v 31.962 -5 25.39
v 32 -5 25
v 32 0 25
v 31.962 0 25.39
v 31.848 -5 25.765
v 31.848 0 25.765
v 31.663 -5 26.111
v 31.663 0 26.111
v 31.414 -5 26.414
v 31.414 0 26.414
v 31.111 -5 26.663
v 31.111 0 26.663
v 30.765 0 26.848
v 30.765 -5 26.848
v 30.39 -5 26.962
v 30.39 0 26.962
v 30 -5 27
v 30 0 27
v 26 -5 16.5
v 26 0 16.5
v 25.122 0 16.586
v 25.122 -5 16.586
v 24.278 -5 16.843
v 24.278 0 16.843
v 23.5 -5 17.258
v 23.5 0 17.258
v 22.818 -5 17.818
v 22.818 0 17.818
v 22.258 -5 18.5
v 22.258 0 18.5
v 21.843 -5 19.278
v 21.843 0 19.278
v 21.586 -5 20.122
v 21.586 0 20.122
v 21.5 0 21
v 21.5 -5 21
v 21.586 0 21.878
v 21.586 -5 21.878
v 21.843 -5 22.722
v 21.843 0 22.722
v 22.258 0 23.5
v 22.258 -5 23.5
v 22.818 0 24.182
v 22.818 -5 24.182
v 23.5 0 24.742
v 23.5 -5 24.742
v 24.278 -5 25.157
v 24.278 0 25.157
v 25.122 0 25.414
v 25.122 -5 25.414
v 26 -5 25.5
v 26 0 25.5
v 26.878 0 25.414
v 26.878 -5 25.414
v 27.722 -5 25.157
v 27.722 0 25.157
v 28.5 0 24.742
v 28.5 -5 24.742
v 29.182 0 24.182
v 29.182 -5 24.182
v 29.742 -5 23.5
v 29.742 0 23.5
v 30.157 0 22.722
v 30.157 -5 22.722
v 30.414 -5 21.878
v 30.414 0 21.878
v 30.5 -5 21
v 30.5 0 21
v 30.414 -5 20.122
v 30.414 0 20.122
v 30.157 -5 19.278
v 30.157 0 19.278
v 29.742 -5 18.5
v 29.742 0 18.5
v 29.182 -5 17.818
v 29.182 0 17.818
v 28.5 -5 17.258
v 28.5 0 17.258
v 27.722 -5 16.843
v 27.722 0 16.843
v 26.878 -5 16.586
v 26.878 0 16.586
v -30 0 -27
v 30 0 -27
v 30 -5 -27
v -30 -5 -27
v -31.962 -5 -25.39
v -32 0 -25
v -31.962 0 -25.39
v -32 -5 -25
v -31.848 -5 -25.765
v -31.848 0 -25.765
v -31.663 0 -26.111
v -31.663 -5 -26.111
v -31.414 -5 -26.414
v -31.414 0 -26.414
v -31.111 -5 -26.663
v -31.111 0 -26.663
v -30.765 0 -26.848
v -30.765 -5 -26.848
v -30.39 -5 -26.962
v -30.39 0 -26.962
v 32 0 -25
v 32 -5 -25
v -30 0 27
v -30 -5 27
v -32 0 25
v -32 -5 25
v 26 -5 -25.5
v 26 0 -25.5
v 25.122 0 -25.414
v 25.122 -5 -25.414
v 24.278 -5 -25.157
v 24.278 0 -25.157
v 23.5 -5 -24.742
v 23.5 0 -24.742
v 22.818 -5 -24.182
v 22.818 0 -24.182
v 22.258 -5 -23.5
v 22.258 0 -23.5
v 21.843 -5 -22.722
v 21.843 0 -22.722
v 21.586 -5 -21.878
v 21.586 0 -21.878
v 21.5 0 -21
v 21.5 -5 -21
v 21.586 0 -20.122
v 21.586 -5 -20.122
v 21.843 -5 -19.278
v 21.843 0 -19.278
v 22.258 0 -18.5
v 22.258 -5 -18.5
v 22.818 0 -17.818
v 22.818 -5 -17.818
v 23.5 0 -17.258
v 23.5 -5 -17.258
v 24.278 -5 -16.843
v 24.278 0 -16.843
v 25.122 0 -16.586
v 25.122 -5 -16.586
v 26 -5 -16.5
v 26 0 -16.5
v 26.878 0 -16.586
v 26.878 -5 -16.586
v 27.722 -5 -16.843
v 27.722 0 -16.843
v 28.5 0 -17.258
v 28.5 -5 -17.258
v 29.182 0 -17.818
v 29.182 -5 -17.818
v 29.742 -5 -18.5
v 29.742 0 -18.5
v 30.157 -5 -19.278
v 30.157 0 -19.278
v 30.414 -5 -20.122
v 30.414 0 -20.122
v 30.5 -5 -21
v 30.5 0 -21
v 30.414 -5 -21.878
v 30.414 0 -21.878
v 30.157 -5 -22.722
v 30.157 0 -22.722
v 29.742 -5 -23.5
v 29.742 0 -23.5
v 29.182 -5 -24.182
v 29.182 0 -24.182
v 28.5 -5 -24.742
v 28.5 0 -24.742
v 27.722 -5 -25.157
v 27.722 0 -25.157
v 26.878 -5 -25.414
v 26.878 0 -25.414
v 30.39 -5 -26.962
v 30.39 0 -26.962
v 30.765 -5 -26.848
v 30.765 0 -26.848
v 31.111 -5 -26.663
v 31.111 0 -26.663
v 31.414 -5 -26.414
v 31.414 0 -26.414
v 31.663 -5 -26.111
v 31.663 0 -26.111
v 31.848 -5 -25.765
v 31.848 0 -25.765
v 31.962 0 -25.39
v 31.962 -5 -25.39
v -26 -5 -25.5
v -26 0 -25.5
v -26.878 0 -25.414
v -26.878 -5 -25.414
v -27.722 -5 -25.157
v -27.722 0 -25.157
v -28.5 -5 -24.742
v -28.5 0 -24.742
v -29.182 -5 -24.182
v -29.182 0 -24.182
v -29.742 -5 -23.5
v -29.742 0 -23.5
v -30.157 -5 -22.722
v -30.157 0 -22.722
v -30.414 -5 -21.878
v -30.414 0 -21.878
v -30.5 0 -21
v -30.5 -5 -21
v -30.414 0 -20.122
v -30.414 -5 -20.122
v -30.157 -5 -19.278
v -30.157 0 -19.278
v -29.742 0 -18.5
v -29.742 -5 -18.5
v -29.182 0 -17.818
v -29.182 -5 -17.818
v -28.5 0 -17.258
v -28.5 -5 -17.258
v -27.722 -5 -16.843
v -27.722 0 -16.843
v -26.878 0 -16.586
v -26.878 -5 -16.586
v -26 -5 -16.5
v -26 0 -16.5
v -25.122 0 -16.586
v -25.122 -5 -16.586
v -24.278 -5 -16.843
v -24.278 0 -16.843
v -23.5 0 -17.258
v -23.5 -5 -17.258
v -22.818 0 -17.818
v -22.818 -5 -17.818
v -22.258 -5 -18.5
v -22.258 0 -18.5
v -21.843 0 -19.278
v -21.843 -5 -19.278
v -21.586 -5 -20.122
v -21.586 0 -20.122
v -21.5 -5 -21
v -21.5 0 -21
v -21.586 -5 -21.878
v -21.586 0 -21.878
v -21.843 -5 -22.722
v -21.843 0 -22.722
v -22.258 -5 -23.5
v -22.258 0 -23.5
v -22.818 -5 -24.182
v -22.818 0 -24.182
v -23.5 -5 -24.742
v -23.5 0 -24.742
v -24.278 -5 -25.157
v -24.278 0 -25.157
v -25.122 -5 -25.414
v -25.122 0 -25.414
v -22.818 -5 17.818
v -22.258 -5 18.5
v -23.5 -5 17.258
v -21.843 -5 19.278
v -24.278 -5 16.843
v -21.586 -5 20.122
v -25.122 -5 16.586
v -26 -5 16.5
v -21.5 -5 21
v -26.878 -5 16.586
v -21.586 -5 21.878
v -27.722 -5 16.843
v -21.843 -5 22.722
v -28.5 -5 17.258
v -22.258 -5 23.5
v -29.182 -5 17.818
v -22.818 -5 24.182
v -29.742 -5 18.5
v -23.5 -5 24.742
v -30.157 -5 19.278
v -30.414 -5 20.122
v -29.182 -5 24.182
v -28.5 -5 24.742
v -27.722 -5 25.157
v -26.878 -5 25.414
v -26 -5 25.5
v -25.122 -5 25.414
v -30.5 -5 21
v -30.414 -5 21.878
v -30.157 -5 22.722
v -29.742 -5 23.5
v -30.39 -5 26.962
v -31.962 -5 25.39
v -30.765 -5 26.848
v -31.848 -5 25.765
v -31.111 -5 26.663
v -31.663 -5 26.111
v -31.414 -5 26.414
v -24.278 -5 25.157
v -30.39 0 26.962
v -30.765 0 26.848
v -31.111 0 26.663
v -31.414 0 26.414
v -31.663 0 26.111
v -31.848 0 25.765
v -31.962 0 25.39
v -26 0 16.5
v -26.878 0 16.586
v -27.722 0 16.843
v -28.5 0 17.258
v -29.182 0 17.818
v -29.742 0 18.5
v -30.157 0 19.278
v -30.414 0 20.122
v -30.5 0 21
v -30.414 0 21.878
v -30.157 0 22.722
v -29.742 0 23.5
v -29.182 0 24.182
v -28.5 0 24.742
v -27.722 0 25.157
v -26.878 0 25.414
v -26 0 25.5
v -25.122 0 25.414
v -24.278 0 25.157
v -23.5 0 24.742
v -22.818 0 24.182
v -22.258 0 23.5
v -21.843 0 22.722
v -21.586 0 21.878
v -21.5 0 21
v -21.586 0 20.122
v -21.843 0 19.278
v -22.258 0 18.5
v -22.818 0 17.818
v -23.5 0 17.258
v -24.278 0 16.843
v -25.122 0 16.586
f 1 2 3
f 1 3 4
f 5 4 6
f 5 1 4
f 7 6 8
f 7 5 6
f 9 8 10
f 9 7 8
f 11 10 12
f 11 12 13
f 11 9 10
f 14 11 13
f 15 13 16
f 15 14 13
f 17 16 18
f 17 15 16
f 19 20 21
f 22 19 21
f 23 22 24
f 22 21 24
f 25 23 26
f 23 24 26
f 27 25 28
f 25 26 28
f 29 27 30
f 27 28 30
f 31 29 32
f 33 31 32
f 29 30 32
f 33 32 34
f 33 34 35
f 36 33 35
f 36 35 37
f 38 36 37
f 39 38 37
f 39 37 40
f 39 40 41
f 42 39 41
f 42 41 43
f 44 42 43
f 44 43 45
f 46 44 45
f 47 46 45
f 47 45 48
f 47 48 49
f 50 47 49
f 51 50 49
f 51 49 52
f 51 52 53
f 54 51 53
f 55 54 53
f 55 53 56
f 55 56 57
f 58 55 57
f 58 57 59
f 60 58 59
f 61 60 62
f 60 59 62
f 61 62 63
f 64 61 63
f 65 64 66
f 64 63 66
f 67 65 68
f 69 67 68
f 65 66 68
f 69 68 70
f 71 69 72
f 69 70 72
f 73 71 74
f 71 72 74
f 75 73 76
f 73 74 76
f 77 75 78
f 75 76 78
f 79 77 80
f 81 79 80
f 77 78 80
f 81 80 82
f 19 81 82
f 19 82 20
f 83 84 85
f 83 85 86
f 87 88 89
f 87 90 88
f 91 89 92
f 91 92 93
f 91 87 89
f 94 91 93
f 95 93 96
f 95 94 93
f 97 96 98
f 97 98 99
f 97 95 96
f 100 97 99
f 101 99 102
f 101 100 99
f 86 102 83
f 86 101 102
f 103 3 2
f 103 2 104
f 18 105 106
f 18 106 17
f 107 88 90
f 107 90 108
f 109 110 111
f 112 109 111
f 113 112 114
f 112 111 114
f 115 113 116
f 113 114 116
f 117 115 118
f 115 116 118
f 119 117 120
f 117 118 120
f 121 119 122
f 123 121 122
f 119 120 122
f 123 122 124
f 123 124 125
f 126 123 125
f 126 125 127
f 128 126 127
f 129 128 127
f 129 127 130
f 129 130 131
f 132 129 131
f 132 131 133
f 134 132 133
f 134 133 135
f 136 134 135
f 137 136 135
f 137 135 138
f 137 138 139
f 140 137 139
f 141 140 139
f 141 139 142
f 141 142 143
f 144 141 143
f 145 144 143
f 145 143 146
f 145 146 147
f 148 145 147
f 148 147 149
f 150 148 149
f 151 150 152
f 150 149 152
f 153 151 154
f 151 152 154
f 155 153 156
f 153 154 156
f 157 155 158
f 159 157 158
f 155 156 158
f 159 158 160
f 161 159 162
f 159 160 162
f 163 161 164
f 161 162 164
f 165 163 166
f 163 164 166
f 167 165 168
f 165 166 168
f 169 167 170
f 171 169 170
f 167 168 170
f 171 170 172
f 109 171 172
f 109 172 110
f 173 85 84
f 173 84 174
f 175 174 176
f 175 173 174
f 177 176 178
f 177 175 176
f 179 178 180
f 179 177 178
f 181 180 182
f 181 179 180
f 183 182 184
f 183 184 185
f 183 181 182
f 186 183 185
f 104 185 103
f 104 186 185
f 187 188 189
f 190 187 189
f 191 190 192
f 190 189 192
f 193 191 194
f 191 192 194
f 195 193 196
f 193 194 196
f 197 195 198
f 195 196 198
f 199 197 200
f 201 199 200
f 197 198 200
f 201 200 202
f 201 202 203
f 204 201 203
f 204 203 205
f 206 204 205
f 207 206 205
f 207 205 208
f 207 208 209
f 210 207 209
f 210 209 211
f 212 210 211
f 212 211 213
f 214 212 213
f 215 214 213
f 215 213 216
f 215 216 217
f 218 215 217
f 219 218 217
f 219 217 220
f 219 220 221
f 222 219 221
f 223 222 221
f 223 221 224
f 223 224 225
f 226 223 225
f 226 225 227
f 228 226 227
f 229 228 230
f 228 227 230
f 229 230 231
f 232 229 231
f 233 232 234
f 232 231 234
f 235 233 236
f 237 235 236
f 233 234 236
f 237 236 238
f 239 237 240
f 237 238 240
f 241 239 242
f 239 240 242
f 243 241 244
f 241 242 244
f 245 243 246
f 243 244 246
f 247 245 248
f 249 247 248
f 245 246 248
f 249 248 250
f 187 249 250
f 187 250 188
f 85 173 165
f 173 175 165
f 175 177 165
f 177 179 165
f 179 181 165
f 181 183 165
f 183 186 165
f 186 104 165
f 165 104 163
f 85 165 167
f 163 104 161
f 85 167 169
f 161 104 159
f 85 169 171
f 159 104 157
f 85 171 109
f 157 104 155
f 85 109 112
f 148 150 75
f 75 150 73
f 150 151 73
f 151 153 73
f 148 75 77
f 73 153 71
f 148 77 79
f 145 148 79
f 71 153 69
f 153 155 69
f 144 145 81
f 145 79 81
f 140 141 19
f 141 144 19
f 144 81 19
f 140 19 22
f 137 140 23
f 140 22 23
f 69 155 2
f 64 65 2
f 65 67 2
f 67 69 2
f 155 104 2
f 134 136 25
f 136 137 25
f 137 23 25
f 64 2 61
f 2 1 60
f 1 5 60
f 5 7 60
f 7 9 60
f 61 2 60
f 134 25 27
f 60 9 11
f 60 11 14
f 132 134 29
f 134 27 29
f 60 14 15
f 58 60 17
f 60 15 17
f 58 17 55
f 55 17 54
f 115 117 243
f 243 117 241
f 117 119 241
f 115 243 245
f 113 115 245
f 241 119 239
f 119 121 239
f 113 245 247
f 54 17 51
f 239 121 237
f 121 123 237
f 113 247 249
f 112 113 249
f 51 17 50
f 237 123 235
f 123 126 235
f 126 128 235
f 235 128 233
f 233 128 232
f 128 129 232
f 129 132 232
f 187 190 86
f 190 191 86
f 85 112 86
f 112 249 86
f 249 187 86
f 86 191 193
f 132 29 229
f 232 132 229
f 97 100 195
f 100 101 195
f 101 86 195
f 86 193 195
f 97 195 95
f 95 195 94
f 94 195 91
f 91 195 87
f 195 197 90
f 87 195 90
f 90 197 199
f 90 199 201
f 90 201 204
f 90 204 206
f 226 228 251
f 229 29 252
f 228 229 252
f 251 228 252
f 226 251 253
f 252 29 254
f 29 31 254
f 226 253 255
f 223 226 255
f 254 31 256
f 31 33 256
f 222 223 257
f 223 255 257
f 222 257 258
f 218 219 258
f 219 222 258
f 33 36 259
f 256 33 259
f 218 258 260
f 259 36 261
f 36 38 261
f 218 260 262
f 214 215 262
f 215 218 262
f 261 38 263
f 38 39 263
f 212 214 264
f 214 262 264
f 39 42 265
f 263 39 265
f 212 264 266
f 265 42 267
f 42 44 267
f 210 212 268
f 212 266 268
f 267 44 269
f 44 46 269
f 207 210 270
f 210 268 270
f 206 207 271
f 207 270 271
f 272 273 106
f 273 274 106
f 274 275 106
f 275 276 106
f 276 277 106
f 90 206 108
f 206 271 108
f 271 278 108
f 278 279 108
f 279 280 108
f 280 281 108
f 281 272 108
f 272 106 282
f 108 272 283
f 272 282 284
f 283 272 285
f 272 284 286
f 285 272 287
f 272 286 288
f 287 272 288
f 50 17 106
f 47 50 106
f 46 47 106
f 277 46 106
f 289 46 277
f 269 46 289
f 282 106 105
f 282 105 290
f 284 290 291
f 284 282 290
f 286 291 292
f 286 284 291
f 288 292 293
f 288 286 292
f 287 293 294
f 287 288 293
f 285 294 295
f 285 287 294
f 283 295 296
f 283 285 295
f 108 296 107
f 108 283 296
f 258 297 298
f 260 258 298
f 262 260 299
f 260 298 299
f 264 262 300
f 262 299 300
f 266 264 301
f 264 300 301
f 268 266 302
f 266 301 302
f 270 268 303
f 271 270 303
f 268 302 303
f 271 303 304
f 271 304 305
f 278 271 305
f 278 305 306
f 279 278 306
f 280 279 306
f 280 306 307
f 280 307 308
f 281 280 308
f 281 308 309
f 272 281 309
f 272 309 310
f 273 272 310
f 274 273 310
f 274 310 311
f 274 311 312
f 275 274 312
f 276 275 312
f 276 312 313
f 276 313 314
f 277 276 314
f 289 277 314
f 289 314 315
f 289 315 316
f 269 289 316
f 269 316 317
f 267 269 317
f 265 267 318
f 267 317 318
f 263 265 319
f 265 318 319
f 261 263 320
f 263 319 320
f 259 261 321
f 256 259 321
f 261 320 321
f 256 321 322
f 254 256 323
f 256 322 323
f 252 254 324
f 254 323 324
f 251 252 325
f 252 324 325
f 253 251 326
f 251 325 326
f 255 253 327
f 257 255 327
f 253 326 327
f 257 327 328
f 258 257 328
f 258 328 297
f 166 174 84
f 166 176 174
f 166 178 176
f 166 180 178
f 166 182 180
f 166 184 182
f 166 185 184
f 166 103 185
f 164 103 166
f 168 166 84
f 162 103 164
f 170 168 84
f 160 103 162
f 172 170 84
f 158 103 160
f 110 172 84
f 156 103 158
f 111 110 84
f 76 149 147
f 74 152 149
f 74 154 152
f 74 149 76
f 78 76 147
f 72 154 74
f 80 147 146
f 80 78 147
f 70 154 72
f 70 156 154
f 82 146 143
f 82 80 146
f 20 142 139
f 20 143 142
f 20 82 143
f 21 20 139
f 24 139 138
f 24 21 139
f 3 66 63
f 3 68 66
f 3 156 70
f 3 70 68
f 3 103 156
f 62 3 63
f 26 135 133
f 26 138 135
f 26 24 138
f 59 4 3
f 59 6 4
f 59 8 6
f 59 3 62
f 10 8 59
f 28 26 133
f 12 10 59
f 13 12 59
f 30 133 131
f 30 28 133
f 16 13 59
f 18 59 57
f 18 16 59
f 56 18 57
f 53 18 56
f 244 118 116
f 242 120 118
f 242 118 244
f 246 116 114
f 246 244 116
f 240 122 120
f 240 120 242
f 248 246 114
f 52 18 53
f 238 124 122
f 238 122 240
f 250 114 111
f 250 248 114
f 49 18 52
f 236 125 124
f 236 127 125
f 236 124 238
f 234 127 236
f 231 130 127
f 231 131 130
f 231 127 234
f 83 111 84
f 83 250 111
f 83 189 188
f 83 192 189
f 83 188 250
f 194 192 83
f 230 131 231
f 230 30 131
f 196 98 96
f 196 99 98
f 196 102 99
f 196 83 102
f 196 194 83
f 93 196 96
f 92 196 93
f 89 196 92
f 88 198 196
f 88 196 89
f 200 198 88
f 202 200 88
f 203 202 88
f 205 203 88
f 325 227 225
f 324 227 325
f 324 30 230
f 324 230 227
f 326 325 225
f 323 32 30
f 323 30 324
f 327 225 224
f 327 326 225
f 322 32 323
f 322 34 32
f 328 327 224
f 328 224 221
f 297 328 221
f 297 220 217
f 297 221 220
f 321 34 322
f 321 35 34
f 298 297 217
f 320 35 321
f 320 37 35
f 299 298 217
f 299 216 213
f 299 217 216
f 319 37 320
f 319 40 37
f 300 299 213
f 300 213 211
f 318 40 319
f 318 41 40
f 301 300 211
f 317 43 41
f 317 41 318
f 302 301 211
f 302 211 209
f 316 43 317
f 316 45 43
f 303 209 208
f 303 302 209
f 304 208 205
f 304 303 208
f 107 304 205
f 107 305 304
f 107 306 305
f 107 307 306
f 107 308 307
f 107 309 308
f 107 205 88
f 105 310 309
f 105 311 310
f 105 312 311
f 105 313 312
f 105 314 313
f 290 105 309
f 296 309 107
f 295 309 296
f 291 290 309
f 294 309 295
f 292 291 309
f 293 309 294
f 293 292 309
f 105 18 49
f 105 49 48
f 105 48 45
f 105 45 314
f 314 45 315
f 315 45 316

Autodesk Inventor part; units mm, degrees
ref_plane "YZ Plane" through (0, 0, 0) normal (1, 0, 0) x (0, 1, 0)
ref_plane "XZ Plane" through (0, 0, 0) normal (0, 1, 0) x (-1, 0, 0)
ref_plane "XY Plane" through (0, 0, 0) normal (0, 0, 1) x (1, 0, 0)
sketch "Sketch1" plane through (0, 0, 0) normal (0, 1, 0) x (-1, 0, 0)
  line L0 (32, 27) -> (-32, 27)
  line L1 (-32, 27) -> (-32, -27)
  line L2 (-32, -27) -> (32, -27)
  line L3 (32, -27) -> (32, 27)
  point P0 (0, -27)
  point P1 (32, 0)
  point P2 (0, 0)
  dimension "d13" = 64
  dimension "d14" = 54
extrude "Extrusion1" add sketch "Sketch1" against normal blind 5
fillet "Fillet1" radius 2 4 edges at (-32, -2.5, 27) (-32, -2.5, -27) (32, -2.5, 27) (32, -2.5, -27)
sketch "Sketch2" plane through (0, -5, 0) normal (0, -1, 0) x (1, 0, 0)
  arc A0 (30, -27) -> (32, -25) centre (30, -25) ccw projected
  line L0 (32, -25) -> (32, 25) projected
  arc A1 (32, 25) -> (30, 27) centre (30, 25) ccw projected
  line L1 (30, 27) -> (-30, 27) projected
  arc A2 (-30, 27) -> (-32, 25) centre (-30, 25) ccw projected
  line L2 (-32, 25) -> (-32, -25) projected
  arc A3 (-32, -25) -> (-30, -27) centre (-30, -25) ccw projected
  line L3 (-30, -27) -> (30, -27) projected
  line L4 (20, 15) -> (-20, 15) construction
  line L5 (-20, 15) -> (-20, -15) construction
  line L6 (-20, -15) -> (20, -15) construction
  line L7 (20, -15) -> (20, 15) construction
  line L8 (-32, 27) -> (32, 27) construction
  line L9 (32, 27) -> (32, -27) construction
  line L10 (32, -27) -> (-32, -27) construction
  line L11 (-32, -27) -> (-32, 27) construction
  line L12 (-32, 27) -> (-20, 15) construction
  line L13 (-32, -27) -> (-20, -15) construction
  line L14 (32, -27) -> (20, -15) construction
  line L15 (32, 27) -> (20, 15) construction
  point P0 (0, 0)
  point P1 (0, 0)
  point P2 (0, -15)
  point P3 (20, 0)
  point P4 (0, 27)
  point P5 (32, 0)
  point P6 (-32, 0)
  point P7 (0, -27)
  point P8 (-26, -21)
  point P9 (26, -21)
  point P10 (26, 21)
  point P11 (-26, 21)
  dimension "d15" = 40
  dimension "d16" = 30
  dimension "d19" = 12
  dimension "d20" = 12
  dimension "d21" = 64
  dimension "d22" = 54
  dimension "d23" = 6
hole "Hole1" at (-26, -5, -21) at (26, -5, -21) at (26, -5, 21) at (-26, -5, 21) direction (0, 1, 0) diameter 9 end through all
properties part number "cubierta1" material "Polycarbonate, Smoke"
